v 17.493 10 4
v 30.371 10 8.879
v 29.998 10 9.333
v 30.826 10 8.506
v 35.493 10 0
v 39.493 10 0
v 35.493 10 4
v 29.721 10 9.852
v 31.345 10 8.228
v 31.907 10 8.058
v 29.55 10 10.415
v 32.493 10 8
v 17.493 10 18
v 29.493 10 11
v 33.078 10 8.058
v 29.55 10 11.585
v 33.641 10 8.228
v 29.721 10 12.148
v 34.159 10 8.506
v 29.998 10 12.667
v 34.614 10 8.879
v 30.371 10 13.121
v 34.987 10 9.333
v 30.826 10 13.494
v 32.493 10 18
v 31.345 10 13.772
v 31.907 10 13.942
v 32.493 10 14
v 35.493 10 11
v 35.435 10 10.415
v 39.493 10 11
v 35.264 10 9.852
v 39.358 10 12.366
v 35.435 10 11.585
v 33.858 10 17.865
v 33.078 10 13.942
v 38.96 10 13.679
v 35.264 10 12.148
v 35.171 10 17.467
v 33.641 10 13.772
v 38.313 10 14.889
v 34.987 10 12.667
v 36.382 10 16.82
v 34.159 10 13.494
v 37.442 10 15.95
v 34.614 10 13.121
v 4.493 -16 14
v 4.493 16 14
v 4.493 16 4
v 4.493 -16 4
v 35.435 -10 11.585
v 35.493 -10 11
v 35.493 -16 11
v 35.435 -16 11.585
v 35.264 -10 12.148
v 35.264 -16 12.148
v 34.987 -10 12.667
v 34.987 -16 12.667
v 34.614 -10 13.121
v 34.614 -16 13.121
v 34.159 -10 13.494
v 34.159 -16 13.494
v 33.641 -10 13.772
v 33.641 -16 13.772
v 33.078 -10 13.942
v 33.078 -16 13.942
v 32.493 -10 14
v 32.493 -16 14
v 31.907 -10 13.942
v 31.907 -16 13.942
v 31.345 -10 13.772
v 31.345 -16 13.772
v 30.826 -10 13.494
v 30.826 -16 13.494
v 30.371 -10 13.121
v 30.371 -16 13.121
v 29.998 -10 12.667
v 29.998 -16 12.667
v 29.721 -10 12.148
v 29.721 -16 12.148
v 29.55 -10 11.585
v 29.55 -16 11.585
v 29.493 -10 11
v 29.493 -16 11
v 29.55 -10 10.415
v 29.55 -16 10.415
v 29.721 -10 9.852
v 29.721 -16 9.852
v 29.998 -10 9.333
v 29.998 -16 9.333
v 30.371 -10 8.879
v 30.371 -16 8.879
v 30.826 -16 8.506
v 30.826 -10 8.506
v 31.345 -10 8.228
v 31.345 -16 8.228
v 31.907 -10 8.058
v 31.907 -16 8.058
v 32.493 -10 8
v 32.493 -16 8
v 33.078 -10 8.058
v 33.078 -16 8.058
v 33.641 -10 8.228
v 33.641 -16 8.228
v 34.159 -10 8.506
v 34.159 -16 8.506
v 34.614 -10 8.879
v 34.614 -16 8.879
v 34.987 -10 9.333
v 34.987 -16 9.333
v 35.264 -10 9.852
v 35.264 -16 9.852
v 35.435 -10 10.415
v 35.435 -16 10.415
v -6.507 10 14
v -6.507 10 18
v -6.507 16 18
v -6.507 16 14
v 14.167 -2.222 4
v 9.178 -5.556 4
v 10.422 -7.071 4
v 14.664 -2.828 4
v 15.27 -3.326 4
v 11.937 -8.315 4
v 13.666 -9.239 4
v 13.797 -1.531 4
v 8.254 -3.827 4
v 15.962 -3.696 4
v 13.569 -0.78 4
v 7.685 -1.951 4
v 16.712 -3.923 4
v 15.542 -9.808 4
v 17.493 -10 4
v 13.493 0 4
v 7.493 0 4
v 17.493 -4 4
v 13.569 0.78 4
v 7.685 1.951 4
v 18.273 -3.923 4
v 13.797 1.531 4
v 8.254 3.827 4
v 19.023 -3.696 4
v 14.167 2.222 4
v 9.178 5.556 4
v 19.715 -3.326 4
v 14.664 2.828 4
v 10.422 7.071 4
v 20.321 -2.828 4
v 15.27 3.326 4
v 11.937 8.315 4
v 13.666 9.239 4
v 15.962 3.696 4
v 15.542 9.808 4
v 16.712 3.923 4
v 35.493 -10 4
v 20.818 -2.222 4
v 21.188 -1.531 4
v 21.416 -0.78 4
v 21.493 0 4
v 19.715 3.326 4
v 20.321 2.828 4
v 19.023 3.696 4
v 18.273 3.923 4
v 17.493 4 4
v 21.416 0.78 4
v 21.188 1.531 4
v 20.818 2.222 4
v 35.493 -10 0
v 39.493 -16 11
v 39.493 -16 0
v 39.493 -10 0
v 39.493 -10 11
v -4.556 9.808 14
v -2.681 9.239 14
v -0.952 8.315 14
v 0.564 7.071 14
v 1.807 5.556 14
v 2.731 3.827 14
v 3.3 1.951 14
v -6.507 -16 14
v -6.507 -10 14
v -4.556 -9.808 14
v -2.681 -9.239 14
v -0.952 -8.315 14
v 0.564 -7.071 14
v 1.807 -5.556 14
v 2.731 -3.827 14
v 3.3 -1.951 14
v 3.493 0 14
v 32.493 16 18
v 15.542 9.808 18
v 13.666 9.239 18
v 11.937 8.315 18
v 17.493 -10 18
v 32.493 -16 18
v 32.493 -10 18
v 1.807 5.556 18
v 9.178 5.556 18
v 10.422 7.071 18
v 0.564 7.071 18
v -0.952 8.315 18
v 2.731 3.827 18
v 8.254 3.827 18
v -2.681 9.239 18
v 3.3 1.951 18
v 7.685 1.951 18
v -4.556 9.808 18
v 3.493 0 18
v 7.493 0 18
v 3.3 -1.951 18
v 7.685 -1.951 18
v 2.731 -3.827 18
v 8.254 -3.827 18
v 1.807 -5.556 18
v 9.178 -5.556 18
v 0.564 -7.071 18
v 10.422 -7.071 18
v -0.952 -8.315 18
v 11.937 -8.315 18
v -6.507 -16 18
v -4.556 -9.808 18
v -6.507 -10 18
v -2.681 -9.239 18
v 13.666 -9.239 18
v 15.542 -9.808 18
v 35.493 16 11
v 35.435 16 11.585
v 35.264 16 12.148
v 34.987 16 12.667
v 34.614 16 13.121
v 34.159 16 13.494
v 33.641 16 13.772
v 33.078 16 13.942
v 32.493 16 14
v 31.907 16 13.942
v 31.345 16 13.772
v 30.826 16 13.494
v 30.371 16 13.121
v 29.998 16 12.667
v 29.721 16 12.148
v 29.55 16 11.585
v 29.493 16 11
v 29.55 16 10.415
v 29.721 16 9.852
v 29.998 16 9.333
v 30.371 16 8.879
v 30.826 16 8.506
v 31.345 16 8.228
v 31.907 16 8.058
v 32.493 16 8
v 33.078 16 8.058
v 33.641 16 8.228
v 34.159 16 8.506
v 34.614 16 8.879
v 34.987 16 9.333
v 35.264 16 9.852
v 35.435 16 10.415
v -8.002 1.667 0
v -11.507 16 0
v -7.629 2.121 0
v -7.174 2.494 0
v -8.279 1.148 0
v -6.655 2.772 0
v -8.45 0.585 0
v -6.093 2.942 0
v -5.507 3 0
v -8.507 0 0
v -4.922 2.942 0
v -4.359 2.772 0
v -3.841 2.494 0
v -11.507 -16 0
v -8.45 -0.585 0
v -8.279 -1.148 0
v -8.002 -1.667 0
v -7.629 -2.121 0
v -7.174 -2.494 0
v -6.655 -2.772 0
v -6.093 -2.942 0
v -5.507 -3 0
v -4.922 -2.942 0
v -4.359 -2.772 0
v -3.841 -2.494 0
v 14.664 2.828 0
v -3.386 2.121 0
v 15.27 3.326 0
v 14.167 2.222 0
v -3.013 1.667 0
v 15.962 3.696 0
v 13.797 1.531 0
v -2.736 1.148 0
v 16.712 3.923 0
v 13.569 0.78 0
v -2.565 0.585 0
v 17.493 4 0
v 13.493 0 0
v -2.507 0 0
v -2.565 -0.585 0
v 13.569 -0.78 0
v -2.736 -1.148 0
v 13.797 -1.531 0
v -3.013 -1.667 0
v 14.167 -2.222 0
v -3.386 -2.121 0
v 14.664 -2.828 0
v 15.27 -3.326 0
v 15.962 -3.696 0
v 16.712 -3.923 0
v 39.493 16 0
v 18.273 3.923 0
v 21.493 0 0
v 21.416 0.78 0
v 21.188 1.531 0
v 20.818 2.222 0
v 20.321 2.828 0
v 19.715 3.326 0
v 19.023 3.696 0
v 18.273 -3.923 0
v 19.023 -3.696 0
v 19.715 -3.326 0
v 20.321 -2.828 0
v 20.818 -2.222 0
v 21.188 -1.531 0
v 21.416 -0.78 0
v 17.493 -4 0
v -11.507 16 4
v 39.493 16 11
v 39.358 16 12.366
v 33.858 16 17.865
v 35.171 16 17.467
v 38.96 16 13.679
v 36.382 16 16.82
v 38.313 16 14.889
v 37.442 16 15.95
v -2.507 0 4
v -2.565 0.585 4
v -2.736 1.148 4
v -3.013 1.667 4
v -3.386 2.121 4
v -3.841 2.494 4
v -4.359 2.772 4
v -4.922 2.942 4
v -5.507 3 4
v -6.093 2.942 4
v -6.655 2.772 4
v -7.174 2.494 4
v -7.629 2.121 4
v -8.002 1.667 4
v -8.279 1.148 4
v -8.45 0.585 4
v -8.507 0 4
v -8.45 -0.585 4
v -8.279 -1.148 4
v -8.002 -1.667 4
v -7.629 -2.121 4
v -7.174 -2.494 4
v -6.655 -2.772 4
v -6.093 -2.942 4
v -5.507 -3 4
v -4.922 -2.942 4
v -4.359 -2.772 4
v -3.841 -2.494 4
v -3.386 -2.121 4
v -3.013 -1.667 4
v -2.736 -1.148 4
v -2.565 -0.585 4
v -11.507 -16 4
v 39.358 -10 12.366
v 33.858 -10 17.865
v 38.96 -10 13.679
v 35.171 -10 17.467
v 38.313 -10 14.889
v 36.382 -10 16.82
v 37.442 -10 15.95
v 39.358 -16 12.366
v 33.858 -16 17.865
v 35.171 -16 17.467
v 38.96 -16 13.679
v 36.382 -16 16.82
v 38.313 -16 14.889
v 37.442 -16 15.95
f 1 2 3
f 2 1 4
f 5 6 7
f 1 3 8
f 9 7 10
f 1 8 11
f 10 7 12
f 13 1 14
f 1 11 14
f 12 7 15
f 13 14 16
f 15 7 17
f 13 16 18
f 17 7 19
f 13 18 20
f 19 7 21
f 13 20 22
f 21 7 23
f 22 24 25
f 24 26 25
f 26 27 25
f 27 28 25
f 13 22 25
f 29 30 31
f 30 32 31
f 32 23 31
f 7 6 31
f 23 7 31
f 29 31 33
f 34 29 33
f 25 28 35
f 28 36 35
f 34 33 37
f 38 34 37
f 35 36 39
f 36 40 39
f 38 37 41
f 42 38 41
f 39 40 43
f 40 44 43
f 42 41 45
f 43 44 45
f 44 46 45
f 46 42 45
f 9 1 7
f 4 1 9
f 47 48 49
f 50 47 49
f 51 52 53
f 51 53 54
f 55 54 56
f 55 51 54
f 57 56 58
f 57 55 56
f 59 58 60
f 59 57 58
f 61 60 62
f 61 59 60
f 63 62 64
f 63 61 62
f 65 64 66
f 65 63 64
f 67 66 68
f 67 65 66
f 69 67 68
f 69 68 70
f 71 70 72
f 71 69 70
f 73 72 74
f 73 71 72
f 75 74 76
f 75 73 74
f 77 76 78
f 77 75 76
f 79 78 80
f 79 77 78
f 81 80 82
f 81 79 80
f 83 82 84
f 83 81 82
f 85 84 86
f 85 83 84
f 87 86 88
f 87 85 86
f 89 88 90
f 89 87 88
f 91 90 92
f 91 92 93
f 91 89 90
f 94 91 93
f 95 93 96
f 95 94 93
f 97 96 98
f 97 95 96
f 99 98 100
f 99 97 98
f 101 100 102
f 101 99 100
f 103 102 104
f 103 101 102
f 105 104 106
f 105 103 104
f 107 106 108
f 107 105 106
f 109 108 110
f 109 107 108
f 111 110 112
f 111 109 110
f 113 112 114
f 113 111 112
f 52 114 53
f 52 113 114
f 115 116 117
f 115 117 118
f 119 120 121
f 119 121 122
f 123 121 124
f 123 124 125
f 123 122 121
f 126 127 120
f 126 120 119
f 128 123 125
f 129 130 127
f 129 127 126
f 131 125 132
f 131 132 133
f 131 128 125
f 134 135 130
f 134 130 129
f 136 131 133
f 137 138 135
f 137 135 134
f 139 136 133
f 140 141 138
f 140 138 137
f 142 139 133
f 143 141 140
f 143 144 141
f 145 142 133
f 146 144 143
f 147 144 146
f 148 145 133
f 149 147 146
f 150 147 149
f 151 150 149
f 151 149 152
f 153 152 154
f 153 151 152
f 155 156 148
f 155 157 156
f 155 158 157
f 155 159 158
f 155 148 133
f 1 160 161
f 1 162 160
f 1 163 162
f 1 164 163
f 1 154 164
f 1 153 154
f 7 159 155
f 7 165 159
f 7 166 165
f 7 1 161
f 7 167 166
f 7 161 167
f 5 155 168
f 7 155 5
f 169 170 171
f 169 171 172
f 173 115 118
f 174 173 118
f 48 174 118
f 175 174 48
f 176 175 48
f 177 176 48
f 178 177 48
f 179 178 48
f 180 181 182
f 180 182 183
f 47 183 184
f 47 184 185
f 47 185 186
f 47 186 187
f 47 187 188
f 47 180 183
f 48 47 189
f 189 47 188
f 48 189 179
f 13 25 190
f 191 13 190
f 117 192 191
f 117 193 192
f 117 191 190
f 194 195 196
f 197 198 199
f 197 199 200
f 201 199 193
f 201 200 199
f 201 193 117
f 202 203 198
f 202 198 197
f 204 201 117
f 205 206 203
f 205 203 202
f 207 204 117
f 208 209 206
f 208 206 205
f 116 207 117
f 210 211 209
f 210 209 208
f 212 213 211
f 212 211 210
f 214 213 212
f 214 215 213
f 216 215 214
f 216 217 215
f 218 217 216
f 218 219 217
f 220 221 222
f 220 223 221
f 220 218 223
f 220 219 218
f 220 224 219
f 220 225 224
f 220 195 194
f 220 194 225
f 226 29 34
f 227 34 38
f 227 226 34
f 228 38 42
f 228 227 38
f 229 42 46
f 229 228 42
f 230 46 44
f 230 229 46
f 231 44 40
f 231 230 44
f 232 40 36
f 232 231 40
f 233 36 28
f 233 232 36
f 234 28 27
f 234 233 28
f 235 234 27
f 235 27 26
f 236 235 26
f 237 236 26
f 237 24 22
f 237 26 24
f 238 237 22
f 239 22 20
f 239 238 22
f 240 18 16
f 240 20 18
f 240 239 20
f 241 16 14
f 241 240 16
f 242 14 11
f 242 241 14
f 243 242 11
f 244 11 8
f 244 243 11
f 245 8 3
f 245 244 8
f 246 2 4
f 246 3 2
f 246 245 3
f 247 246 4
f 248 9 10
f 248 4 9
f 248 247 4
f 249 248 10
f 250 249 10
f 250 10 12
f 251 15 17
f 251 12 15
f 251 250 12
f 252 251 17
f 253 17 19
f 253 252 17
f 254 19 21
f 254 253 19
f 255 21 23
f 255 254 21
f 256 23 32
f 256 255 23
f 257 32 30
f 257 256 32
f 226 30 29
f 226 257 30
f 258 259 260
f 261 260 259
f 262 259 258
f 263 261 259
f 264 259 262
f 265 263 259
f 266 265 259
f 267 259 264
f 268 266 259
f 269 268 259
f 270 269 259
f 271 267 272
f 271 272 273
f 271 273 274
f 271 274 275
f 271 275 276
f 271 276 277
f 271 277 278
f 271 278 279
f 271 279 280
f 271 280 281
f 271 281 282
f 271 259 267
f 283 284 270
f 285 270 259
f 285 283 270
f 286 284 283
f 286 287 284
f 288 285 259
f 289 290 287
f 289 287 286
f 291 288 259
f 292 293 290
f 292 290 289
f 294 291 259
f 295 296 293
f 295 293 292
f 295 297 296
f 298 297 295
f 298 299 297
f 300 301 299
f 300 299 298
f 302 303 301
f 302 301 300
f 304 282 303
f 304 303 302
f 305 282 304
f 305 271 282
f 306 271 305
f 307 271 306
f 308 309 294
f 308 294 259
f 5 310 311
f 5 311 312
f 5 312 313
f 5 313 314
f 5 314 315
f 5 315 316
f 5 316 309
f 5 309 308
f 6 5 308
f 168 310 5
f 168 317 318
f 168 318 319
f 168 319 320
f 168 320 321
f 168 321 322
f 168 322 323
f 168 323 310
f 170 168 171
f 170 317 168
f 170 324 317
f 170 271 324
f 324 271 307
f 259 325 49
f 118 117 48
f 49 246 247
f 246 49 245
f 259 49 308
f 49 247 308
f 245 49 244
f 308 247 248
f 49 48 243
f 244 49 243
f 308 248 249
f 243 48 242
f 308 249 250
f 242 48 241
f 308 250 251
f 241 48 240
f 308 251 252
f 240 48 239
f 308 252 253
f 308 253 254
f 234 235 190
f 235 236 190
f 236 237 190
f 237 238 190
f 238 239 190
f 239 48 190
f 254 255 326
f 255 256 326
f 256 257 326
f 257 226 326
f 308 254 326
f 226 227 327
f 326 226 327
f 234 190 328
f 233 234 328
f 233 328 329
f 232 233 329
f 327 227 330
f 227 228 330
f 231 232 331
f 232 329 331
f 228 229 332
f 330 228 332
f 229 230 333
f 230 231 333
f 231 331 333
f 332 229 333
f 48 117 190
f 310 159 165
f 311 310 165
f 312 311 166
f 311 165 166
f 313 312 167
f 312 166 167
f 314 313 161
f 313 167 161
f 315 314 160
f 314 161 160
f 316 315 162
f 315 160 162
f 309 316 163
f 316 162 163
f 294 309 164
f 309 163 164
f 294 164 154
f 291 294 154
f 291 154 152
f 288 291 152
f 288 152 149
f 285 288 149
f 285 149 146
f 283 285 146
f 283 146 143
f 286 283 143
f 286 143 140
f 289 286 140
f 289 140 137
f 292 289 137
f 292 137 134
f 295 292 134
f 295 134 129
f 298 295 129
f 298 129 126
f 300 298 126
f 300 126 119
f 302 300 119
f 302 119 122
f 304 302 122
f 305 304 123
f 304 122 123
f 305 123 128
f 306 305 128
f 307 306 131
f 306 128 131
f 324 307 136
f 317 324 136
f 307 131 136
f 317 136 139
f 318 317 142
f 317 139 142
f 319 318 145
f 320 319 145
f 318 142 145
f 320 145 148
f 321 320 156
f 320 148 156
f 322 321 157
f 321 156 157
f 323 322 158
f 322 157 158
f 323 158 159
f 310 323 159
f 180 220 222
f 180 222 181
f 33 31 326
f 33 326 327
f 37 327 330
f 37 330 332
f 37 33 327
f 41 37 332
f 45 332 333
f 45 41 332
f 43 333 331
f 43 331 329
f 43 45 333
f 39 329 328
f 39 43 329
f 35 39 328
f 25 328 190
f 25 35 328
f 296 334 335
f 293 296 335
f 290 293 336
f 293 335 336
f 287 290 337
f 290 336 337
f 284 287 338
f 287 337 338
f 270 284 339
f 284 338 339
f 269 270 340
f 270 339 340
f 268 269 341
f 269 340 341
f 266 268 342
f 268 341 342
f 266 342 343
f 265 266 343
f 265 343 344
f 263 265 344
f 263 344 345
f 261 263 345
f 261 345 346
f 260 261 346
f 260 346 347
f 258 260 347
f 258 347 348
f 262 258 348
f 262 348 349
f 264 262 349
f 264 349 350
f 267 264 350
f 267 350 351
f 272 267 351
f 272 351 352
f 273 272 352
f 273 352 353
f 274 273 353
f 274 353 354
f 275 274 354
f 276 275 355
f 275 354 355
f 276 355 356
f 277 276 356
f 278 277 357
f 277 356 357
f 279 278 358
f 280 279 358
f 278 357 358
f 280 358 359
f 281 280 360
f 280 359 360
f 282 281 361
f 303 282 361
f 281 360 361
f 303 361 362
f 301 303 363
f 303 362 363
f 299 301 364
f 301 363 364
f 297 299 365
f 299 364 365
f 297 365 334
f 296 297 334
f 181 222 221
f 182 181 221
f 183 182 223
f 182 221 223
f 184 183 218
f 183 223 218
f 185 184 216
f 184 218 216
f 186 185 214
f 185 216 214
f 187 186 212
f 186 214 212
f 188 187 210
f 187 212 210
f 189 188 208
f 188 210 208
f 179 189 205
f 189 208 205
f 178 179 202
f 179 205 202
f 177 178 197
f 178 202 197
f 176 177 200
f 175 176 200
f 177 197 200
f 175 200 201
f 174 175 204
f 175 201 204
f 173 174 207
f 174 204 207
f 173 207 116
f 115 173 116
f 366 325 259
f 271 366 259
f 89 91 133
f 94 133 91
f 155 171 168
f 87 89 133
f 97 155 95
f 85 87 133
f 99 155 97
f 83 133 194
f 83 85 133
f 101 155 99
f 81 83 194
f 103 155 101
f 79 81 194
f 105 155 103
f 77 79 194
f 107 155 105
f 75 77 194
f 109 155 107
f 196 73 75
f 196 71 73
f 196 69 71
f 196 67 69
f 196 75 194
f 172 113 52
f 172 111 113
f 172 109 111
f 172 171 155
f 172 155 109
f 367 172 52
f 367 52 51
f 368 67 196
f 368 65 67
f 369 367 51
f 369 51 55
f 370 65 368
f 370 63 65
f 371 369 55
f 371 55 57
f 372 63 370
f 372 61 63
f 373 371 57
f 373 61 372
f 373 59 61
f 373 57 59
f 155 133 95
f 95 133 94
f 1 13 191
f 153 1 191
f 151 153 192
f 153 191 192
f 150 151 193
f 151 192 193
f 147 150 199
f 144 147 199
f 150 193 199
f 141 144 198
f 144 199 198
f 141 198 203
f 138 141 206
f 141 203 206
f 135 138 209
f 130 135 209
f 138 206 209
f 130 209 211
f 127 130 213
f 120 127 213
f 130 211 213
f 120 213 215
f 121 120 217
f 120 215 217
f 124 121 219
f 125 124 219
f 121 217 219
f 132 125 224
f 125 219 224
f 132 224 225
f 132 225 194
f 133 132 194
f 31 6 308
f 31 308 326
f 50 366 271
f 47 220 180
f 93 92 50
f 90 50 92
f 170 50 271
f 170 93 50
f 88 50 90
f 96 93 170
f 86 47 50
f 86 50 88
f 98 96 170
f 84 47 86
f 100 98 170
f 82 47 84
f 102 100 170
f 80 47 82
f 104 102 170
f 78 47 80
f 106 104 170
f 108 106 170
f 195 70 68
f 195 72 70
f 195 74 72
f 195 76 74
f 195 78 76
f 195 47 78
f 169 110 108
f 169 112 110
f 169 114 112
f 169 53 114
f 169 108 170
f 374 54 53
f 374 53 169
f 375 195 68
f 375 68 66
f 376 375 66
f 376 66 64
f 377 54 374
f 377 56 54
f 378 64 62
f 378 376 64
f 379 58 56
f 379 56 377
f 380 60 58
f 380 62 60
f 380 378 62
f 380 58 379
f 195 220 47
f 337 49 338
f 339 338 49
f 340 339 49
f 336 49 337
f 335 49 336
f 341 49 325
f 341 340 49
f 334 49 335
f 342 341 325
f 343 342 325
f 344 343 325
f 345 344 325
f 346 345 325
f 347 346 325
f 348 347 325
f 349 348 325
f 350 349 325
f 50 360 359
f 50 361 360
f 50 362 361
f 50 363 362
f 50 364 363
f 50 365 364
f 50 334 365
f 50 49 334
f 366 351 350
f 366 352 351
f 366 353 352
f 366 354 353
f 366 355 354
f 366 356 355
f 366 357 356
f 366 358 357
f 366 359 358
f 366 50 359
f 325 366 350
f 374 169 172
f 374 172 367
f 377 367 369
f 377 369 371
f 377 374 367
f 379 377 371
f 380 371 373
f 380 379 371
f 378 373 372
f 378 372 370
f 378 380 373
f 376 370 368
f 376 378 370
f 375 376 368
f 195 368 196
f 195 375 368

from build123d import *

# Parameters (mm, degrees)
F0_R     = 3
F1_DEPTH = 16
F3_DEPTH = 14
F4_W     = 20
F4_H     = 4
F5_DEPTH = 4
F6_R     = 3
F7_DEPTH = 25
F8_R     = 4
F9_DEPTH = 25


with BuildPart() as f1:
    # F0 (on Front) → F1 (new body, symmetric)
    with BuildSketch(Plane.XZ):
        with BuildLine():
            Line((-11.5073820825, 4), (-11.5073820825, 0))
            Line((-11.5073820825, 0), (39.4926179175, 0))
            Line((39.4926179175, 0), (39.4926179175, 11))
            ThreePointArc((39.4926179175, 11), (37.4423653858, 15.9497474683), (32.4926179175, 18))
            Line((32.4926179175, 18), (-6.5073820825, 18))
            Line((-6.5073820825, 18), (-6.5073820825, 14))
            Line((-6.5073820825, 14), (4.4926179175, 14))
            Line((4.4926179175, 14), (4.4926179175, 4))
            Line((4.4926179175, 4), (-11.5073820825, 4))
        make_face()
        with Locations((32.4926179175, 11)):
            Circle(F0_R, mode=Mode.SUBTRACT)
    extrude(amount=F1_DEPTH, both=True)

    # F2 (on face) → F3 (cut)
    with BuildSketch(Plane.XY.offset(18)):
        with BuildLine():
            Line((44.1028997302, 10), (32.4926179175, 10))
            Line((32.4926179175, 10), (17.4926179175, 10))
            ThreePointArc((17.4926179175, 10), (7.4926179175, 0), (17.4926179175, -10))
            Line((17.4926179175, -10), (32.4926179175, -10))
            Line((32.4926179175, -10), (44.1028997302, -10))
            Line((44.1028997302, -10), (44.1028997302, 10))
        make_face()
        with BuildLine():
            ThreePointArc((-6.5073820825, -10), (3.4926179175, 0), (-6.5073820825, 10))
            Line((-6.5073820825, 10), (-6.5073820825, -10))
        make_face()
    extrude(amount=-F3_DEPTH, mode=Mode.SUBTRACT)

    # F4 (on face) → F5 (cut)
    with BuildSketch(Plane.YZ.offset(39.4926179175)):
        with Locations((0, 2)):
            Rectangle(F4_W, F4_H)
    extrude(amount=-F5_DEPTH, mode=Mode.SUBTRACT)

    # F6 (on face) → F7 (cut)
    with BuildSketch(Plane.XY.offset(4)):
        with Locations((-5.5073820825, 0)):
            Circle(F6_R)
    extrude(amount=-F7_DEPTH, mode=Mode.SUBTRACT)

    # F8 (on face) → F9 (cut)
    with BuildSketch(Plane.XY.offset(4)):
        with Locations((17.4926179175, 0)):
            Circle(F8_R)
    extrude(amount=-F9_DEPTH, mode=Mode.SUBTRACT)


solid = f1.part
